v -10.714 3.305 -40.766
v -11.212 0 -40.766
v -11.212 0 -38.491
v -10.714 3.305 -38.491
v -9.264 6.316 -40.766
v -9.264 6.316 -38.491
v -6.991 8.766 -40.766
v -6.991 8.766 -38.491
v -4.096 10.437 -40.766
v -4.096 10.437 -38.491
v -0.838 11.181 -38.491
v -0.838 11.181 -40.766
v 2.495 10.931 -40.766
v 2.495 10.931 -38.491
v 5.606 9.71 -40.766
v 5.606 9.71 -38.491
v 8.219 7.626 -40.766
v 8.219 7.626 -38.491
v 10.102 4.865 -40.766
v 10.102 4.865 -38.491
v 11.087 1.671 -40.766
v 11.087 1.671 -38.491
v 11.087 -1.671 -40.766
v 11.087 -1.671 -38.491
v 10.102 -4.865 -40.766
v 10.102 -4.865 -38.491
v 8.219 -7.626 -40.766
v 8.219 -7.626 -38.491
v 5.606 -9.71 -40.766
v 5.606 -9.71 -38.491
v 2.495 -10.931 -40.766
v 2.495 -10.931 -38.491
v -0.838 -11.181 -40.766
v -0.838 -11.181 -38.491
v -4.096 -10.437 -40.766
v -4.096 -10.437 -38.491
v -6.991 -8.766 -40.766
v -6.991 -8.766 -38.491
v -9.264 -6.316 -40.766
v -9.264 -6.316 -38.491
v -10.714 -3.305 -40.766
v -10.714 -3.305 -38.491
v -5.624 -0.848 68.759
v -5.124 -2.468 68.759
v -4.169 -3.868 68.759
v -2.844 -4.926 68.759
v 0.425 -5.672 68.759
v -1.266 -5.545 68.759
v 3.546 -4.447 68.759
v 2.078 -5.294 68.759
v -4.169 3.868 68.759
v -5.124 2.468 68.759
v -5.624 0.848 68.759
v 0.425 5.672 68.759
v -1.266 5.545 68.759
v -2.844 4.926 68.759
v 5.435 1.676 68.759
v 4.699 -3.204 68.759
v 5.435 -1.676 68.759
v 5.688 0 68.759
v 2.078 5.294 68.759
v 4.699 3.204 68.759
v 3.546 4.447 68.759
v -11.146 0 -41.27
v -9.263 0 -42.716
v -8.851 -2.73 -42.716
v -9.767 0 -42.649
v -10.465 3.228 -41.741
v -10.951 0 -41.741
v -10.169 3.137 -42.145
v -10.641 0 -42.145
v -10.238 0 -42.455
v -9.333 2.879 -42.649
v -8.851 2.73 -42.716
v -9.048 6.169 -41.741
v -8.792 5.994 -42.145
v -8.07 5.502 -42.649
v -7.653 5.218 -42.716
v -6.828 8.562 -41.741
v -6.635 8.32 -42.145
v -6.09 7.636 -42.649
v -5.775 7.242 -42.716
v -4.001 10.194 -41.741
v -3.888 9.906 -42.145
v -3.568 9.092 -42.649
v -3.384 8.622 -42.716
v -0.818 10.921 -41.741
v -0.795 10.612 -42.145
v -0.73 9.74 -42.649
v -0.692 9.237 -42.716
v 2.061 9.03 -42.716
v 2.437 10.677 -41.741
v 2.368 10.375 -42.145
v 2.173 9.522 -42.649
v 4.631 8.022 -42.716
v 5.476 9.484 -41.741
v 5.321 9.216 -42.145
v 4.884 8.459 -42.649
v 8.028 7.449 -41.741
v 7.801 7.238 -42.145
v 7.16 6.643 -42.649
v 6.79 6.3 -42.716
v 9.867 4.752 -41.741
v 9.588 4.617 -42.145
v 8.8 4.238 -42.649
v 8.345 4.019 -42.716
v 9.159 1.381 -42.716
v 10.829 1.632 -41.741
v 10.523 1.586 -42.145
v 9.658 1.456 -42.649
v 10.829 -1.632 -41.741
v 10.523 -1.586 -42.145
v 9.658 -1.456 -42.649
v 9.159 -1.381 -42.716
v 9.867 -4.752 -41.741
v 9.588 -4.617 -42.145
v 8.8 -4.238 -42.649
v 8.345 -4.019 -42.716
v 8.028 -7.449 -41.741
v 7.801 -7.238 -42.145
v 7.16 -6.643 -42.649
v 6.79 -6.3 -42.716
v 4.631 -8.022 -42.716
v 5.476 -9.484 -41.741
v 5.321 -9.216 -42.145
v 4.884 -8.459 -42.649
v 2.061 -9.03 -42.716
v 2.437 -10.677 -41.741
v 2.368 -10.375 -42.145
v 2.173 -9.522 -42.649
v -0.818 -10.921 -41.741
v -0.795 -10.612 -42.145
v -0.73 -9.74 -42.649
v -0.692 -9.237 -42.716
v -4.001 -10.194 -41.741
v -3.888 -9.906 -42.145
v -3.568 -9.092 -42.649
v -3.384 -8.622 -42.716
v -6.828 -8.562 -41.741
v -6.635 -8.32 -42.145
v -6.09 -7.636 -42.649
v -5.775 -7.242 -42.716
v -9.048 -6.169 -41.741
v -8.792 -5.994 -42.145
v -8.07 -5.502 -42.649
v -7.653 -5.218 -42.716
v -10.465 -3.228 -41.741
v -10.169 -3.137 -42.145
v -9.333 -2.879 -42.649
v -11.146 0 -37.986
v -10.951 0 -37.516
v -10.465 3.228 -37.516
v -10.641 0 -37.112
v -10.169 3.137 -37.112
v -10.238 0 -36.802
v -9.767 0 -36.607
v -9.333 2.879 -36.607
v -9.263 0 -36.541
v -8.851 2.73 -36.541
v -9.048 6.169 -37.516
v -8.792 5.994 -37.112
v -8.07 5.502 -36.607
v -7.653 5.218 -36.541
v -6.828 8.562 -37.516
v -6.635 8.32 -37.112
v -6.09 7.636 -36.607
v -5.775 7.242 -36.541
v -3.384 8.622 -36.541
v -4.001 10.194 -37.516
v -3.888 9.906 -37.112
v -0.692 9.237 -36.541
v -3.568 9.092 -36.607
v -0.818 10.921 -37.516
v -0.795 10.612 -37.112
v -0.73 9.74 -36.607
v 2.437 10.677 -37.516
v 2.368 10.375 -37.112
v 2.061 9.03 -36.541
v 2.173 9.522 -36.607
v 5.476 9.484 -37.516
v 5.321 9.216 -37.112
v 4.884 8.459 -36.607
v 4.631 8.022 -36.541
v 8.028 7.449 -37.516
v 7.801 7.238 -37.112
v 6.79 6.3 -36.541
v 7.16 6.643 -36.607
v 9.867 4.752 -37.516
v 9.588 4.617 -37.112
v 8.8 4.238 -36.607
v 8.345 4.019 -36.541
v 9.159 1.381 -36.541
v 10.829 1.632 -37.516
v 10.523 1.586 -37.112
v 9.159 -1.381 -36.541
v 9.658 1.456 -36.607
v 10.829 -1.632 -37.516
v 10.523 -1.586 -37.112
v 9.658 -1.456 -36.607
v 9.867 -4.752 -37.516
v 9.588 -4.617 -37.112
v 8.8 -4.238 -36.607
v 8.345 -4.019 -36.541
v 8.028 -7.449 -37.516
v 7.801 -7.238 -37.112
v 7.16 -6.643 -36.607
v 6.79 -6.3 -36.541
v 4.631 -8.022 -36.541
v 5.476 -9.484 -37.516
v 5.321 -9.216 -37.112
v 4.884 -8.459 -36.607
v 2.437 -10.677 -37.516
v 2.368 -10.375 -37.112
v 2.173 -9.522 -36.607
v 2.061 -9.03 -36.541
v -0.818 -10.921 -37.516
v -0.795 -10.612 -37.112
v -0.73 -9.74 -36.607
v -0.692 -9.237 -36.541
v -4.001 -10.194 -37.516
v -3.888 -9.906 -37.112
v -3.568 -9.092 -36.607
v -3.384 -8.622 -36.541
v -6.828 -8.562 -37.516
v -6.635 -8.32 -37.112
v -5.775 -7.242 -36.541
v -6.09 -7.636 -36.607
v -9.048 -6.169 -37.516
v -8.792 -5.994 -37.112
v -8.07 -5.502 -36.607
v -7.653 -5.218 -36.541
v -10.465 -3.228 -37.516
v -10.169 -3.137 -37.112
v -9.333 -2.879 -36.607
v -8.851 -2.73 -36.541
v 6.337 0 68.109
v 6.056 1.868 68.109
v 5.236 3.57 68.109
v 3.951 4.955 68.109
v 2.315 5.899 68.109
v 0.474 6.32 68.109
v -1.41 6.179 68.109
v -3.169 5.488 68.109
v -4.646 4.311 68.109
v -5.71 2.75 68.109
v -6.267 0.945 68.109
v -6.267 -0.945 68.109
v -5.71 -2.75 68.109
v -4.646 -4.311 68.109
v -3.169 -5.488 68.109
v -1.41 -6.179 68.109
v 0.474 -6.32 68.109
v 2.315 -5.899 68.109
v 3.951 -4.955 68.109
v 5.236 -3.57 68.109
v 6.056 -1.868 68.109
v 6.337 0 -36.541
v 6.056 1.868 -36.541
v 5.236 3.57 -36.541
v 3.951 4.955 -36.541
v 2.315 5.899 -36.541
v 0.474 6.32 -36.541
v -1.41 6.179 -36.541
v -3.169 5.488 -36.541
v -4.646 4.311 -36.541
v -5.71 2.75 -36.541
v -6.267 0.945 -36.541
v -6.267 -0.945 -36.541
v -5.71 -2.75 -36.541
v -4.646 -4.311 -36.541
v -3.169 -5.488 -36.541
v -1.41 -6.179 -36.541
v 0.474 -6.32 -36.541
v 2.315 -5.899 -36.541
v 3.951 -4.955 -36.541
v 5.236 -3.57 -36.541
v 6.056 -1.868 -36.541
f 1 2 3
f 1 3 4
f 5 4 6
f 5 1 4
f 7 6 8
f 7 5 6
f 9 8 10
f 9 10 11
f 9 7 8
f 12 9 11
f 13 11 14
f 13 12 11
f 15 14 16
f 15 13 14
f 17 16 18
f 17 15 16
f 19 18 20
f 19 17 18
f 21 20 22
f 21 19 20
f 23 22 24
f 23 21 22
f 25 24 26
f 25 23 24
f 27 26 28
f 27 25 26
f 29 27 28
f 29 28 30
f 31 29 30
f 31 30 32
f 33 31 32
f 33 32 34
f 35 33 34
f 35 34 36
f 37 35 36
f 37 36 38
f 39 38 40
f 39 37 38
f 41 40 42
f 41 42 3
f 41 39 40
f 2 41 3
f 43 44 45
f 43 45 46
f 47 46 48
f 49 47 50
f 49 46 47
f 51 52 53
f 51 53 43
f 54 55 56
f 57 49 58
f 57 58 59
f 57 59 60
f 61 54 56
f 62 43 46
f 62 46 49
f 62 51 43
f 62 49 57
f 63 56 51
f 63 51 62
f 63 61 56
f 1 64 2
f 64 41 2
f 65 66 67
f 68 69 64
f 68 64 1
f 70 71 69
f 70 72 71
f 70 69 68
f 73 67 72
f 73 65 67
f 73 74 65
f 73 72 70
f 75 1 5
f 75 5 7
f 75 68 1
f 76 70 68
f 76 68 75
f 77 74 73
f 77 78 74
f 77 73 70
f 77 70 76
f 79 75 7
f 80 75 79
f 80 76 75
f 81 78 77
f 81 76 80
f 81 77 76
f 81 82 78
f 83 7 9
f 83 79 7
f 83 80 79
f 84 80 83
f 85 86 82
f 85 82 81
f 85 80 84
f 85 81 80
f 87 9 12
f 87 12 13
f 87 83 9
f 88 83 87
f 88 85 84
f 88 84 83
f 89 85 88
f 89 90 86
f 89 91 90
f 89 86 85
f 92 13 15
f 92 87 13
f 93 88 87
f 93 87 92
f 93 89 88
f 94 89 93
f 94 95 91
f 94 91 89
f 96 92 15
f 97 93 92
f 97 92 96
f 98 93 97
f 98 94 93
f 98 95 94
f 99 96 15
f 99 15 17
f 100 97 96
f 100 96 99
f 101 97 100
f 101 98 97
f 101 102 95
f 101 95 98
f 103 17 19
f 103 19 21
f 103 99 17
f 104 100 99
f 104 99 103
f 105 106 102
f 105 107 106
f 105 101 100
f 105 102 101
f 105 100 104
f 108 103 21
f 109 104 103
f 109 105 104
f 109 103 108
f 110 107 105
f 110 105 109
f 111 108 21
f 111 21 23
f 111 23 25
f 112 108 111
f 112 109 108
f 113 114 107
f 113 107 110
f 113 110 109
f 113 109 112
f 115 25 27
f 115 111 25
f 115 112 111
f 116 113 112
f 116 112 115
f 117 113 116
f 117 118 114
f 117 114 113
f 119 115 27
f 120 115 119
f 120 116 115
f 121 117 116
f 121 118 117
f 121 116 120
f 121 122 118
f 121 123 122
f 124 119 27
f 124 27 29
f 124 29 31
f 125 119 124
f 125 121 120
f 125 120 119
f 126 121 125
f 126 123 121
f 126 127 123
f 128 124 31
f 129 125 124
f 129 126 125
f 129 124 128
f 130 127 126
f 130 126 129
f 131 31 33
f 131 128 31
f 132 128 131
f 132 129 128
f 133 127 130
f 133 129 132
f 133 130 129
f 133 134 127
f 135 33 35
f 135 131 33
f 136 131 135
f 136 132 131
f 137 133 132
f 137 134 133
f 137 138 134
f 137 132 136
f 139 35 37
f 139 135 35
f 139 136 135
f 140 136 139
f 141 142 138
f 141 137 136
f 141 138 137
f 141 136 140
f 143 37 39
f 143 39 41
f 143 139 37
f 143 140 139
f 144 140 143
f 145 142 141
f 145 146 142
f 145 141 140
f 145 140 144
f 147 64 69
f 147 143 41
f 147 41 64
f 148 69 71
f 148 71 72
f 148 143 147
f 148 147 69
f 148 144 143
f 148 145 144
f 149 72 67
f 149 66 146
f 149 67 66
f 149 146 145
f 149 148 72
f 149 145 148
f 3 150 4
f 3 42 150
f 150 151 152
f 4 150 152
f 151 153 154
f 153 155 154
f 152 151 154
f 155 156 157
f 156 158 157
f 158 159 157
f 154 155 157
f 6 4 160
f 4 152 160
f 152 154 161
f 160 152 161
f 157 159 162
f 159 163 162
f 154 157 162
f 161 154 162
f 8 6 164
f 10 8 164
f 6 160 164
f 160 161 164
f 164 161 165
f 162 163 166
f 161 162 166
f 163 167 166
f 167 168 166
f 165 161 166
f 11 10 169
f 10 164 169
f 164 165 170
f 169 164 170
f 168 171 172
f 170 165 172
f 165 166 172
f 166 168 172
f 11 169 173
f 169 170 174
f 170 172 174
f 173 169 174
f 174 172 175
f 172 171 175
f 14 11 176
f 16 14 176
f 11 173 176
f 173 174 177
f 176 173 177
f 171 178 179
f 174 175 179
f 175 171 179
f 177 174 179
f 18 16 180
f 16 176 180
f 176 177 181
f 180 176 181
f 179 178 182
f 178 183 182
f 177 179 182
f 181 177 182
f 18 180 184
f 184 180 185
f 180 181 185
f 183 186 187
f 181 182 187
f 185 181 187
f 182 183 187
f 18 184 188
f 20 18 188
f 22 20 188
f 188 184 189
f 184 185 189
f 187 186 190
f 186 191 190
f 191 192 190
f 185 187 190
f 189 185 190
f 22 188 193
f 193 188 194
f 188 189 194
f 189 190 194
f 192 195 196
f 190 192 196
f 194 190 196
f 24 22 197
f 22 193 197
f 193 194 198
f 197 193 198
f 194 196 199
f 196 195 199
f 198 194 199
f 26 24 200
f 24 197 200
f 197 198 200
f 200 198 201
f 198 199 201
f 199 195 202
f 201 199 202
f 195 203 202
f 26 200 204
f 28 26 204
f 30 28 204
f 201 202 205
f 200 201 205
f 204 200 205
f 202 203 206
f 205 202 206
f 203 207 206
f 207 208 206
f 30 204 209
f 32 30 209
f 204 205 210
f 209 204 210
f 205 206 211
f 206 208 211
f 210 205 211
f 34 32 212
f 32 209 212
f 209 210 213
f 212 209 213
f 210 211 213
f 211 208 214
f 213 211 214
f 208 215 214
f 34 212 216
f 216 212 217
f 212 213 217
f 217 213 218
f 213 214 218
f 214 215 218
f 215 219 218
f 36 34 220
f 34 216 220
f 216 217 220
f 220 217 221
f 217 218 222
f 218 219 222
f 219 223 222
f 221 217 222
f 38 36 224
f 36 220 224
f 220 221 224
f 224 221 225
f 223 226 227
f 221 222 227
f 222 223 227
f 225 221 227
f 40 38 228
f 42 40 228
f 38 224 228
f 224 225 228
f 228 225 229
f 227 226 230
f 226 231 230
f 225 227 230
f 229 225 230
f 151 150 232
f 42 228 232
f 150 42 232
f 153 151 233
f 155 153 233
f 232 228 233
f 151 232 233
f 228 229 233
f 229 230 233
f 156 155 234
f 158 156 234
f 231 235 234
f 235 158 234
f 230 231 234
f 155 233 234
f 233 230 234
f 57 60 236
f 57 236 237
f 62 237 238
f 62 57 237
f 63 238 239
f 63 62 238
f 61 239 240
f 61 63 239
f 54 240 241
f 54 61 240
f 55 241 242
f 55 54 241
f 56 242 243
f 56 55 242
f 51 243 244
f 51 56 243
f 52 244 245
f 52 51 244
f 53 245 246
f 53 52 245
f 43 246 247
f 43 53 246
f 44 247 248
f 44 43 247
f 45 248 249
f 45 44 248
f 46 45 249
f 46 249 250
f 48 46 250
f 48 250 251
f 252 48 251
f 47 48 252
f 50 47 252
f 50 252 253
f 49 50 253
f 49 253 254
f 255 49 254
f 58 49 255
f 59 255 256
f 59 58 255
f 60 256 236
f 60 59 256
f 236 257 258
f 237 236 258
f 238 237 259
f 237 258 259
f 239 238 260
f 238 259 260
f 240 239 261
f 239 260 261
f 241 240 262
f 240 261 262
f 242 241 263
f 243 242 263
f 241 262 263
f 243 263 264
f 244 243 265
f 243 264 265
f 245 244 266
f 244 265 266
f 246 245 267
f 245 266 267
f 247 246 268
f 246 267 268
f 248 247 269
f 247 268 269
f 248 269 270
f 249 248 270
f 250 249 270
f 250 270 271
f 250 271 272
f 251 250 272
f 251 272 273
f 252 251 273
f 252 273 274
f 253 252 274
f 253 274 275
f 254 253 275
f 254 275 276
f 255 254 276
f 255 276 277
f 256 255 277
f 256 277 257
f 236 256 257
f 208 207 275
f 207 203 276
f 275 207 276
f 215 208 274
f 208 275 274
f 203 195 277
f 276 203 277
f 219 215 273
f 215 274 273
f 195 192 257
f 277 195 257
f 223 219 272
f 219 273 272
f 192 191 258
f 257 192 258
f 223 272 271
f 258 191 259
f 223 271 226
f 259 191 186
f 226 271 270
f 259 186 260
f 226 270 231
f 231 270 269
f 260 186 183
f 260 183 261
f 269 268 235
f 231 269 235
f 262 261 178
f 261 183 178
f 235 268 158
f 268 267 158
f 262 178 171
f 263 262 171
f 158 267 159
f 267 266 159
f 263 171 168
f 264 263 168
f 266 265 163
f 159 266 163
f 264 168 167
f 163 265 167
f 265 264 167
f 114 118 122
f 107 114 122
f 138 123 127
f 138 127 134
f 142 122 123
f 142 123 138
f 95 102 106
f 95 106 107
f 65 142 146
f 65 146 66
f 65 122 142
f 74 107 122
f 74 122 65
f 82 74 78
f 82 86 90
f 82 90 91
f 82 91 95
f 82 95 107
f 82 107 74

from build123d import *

# Parameters (mm, degrees)
ESQUISSE1_R        = 0.975
BOSS_EXTRU_1_DEPTH = 17.15
ESQUISSE2_R        = 1.725
BOSS_EXTRU_2_DEPTH = 0.95
CONG_1_R           = 0.3
CHANFREIN1_SIZE    = 0.1
SCALE1_SCALE       = 6.5


with BuildPart() as part:
    # Esquisse1 → Boss.-Extru.1 (new body)
    with BuildSketch(Plane.XY):
        Circle(ESQUISSE1_R)
    extrude(amount=BOSS_EXTRU_1_DEPTH)

    # Esquisse2 → Boss.-Extru.2 (add)
    with BuildSketch(Plane(origin=(0, 0, 0), x_dir=(-1, 0, 0), z_dir=(0, 0, -1))):
        Circle(ESQUISSE2_R)
    extrude(amount=-BOSS_EXTRU_2_DEPTH)

    # Congé1
    cong_1_edges = [part.edges().sort_by_distance(p)[0] for p in [
        (1.725, 0, 0),
        (1.725, 0, 0.95),
    ]]
    fillet(cong_1_edges, radius=CONG_1_R)

    # Chanfrein1
    chanfrein1_edges = [part.edges().sort_by_distance(p)[0] for p in [
        (-0.975, 0, 17.15),
    ]]
    chamfer(chanfrein1_edges, length=CHANFREIN1_SIZE)


with BuildPart() as part_1:
    # Scale1: scaled about (0, 0, 7.76650322)
    add(part.part.scale(SCALE1_SCALE).moved(Location((0, 0, -42.71576771))))


solid = part_1.part
